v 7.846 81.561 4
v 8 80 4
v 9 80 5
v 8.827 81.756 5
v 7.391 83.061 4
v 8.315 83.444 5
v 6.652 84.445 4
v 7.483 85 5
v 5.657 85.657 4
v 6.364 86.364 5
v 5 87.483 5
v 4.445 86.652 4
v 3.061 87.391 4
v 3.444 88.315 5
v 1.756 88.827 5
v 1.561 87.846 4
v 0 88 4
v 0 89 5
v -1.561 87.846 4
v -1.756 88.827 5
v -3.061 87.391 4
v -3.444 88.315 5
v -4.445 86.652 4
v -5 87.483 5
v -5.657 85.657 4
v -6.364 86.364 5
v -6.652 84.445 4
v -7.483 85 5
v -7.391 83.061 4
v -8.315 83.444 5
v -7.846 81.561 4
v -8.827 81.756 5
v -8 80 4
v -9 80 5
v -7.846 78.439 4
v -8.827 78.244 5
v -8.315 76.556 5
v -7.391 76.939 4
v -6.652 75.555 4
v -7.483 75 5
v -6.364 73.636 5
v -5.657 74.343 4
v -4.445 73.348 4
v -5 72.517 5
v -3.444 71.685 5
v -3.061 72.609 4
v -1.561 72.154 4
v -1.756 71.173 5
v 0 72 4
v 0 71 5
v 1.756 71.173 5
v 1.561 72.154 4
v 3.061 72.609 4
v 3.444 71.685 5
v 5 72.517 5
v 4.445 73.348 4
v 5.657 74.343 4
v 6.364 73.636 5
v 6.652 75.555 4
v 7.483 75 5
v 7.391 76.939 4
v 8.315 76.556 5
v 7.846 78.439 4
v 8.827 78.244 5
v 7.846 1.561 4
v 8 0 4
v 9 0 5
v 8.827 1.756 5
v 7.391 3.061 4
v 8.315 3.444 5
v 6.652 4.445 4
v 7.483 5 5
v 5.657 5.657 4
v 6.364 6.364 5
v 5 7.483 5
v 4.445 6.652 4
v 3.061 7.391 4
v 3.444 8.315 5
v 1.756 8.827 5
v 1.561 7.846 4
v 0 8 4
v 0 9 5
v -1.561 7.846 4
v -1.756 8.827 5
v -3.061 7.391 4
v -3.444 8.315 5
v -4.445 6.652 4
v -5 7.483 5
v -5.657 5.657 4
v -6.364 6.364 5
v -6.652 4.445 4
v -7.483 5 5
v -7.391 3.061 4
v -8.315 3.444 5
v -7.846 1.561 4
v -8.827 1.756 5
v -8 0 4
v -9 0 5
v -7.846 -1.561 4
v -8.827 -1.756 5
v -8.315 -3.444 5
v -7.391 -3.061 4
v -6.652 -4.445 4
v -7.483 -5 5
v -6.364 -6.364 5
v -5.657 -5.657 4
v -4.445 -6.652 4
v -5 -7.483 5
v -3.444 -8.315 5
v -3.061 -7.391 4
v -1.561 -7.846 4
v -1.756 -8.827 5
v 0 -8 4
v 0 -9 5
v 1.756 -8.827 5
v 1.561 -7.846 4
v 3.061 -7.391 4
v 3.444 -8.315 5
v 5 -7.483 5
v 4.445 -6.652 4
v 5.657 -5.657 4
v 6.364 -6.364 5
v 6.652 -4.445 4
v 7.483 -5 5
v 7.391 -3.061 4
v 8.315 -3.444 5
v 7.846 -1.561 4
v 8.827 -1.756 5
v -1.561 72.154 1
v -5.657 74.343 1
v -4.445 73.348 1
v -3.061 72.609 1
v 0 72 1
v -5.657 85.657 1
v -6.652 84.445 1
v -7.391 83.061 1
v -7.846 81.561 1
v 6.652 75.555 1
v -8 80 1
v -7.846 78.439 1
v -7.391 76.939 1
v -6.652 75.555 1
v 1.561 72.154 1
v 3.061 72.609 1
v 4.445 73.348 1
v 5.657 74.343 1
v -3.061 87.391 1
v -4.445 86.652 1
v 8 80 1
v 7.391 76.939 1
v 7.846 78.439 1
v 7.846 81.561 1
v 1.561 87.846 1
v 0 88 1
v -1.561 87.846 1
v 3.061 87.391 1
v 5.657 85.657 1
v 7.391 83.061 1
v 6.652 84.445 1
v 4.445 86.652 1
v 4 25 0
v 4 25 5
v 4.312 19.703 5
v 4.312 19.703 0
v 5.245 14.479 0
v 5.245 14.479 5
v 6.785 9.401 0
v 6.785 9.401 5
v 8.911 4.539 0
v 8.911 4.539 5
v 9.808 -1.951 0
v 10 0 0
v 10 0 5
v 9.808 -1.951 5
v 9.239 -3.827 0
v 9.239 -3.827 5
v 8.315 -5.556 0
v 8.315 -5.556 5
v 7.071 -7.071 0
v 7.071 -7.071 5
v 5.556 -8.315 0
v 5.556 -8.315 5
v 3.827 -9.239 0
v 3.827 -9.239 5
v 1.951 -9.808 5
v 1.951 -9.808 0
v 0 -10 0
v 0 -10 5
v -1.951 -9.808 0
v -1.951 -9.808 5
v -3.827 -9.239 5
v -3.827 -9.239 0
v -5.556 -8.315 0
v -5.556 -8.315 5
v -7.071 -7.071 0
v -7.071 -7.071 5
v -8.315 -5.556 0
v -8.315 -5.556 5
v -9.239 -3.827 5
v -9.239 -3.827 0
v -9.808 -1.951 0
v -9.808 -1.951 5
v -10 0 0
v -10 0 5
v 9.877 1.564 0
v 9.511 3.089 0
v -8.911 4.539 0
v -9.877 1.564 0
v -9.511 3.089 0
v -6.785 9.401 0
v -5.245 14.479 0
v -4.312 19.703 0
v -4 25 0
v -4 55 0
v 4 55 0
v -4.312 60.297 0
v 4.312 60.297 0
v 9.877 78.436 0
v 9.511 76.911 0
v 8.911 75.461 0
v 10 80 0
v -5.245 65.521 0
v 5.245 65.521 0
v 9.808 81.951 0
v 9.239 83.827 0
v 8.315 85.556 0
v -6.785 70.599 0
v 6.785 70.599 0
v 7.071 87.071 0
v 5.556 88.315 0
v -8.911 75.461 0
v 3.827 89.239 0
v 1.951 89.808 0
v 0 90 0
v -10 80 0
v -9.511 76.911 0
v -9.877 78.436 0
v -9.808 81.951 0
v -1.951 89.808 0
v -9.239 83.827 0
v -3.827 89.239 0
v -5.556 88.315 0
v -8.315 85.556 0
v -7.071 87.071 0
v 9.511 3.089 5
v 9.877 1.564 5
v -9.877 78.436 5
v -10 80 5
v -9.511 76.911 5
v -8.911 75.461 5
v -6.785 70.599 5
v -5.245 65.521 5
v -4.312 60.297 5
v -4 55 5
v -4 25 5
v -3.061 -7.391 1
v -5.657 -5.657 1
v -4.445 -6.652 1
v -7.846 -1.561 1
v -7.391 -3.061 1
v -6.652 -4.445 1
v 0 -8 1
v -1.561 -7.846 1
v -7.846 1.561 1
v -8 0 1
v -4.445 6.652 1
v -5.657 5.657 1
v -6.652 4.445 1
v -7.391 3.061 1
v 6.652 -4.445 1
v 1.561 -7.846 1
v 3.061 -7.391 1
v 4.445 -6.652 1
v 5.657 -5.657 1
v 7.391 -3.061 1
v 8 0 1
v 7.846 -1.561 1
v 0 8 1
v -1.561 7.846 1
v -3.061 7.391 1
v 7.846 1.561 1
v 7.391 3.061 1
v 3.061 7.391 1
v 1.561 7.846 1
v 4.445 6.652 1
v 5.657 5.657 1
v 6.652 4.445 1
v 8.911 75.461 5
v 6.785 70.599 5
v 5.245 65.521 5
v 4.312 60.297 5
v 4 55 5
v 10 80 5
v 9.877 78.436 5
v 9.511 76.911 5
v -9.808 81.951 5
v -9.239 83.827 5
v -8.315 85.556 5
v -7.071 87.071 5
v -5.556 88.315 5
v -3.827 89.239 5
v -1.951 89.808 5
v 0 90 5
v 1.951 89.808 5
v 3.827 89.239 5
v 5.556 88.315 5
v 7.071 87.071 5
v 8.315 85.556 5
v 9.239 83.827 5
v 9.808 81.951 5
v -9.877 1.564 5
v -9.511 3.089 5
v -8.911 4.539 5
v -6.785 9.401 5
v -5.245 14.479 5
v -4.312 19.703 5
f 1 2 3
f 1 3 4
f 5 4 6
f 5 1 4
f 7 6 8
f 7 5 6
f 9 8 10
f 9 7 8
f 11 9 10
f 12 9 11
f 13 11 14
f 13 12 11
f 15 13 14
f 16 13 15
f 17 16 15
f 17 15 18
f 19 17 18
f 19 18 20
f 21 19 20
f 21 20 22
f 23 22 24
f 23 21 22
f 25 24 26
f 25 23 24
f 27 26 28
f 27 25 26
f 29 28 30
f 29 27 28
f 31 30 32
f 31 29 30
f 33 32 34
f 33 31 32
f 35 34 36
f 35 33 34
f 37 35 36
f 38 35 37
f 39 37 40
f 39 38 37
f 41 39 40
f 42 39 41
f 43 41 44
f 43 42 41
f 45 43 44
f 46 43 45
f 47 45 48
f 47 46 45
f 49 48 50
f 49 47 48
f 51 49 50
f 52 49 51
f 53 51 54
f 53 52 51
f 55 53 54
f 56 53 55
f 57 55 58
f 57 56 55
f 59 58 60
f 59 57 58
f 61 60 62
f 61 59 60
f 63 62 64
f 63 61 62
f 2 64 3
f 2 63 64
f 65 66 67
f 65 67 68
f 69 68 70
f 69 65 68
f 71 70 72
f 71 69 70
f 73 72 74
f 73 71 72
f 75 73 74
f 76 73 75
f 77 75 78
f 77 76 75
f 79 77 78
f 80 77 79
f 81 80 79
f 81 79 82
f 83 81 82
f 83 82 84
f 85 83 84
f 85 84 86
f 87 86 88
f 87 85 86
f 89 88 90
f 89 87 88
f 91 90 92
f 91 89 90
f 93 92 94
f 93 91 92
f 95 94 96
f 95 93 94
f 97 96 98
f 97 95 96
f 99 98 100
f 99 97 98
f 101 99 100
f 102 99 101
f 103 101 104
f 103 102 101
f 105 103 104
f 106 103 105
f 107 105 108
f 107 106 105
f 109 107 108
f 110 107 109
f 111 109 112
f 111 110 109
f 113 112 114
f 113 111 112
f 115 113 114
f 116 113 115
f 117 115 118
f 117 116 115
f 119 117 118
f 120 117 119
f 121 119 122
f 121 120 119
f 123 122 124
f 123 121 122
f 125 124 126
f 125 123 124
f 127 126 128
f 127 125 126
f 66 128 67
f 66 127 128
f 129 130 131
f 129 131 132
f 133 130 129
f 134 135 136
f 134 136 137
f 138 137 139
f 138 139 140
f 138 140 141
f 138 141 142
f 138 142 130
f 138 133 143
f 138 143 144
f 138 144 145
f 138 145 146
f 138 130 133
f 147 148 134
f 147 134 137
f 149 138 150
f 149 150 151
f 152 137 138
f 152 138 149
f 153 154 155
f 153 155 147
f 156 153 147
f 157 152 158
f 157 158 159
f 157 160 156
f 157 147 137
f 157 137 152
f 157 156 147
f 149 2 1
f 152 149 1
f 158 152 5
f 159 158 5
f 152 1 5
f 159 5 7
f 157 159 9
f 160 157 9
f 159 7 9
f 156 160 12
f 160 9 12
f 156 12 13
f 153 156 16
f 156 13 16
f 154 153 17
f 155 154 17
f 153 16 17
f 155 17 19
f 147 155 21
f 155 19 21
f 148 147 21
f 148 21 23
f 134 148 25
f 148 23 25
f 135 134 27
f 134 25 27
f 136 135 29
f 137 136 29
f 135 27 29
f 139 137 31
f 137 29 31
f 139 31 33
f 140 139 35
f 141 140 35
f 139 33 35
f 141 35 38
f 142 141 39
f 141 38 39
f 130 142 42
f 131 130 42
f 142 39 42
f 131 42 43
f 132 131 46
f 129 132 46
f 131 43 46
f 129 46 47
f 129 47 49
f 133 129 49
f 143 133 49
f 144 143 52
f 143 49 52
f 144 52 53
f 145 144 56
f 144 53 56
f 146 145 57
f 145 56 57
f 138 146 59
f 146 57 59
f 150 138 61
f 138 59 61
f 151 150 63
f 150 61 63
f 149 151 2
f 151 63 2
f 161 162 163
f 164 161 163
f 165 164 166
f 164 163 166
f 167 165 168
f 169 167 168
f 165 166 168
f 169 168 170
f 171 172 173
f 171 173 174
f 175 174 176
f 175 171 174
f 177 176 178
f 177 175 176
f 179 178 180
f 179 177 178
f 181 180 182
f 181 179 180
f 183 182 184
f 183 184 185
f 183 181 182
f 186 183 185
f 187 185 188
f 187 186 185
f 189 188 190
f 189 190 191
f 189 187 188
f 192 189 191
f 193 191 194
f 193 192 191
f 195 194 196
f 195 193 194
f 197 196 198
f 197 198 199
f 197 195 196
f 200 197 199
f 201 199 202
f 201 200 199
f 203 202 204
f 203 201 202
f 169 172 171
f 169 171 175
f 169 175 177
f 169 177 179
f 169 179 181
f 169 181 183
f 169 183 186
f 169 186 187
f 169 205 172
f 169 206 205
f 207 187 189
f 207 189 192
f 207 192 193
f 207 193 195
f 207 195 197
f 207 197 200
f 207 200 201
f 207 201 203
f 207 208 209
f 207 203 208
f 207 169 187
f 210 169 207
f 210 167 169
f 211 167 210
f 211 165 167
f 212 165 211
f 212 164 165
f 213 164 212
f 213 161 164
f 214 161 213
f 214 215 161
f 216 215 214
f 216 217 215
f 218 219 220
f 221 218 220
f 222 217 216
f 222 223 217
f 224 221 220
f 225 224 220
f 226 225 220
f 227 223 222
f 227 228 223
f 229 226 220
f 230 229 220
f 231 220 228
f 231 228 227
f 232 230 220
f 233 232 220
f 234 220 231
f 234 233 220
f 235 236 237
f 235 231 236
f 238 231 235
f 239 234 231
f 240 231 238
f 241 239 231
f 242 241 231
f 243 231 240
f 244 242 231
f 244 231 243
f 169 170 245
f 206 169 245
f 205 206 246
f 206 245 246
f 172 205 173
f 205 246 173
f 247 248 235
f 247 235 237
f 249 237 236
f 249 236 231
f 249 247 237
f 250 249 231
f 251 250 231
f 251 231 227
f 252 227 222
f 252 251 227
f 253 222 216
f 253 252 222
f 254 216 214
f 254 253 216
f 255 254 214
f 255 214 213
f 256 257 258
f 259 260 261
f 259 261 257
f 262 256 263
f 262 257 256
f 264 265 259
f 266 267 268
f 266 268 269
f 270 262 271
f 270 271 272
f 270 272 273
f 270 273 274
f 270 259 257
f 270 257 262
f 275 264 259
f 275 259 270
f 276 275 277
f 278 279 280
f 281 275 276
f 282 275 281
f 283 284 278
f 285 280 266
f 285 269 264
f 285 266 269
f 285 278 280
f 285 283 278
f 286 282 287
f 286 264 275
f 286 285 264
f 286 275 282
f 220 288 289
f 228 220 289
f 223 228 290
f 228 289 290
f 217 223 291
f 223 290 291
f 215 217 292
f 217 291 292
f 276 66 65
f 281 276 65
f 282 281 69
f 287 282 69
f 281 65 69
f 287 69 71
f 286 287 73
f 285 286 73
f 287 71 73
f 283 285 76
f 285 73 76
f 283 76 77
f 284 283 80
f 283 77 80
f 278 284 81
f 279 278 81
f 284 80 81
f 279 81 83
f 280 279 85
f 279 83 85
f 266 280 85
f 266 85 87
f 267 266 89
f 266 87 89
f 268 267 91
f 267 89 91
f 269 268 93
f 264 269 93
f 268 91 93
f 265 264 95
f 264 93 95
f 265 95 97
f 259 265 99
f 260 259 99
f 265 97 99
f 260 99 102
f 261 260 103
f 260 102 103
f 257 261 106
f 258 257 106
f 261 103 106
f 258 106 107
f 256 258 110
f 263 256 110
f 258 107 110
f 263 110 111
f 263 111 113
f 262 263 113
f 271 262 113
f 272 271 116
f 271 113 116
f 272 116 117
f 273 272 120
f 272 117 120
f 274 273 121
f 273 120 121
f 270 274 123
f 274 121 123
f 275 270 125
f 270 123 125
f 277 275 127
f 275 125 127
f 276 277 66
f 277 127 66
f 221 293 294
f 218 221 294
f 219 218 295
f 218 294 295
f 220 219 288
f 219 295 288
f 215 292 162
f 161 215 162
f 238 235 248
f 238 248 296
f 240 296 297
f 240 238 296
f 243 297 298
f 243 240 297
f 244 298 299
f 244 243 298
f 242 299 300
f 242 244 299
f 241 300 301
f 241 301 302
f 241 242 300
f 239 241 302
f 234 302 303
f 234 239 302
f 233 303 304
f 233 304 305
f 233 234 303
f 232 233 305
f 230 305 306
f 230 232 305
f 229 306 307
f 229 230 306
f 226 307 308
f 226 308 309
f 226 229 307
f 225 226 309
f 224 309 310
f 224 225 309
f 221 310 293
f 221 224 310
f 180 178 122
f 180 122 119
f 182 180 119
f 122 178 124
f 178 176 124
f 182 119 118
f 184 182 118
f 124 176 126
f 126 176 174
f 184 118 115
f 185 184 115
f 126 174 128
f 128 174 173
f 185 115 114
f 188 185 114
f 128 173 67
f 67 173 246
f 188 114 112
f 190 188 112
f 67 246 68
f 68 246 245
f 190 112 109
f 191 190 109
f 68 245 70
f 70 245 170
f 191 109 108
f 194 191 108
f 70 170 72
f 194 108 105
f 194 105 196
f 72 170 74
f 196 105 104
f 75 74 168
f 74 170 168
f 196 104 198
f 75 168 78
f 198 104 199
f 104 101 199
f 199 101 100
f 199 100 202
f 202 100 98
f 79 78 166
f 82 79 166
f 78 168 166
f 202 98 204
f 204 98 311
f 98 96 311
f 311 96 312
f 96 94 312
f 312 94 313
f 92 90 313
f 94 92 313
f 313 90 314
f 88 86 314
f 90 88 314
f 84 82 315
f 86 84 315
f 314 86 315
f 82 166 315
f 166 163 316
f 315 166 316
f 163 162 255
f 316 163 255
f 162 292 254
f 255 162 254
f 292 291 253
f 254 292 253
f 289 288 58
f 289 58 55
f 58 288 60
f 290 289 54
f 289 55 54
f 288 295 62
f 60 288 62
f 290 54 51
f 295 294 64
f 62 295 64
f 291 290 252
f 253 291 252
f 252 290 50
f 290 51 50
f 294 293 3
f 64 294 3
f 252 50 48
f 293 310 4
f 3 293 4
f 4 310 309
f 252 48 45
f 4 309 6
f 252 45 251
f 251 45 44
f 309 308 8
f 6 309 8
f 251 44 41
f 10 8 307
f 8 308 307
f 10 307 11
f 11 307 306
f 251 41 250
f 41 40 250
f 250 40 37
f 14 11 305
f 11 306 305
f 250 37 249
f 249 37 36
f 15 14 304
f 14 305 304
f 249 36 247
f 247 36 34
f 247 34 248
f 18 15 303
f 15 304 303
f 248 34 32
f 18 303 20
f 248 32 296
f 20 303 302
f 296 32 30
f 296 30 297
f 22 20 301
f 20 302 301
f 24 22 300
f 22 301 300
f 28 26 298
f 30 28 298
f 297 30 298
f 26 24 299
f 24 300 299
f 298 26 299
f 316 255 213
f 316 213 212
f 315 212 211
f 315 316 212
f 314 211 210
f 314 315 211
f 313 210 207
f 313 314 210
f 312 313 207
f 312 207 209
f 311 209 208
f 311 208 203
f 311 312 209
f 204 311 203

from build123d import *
from build123d.topology import SkipClean

# Parameters (mm, degrees)
BOSS_EXTRU_1_DEPTH      = 5
ESQUISSE2_R             = 8
ENL_V_MAT_EXTRU_1_DEPTH = 4
ENL_V_MAT_EXTRU_2_DEPTH = 91.691785736
CHANFREIN1_SIZE         = 1


with BuildPart() as part:
    # Esquisse1 → Boss.-Extru.1 (new body)
    with BuildSketch(Plane.XY):
        with BuildLine():
            Line((-10, 0), (-10, 80))
            ThreePointArc((-10, 80), (0, 90), (10, 80))
            Line((10, 80), (10, 0))
            ThreePointArc((10, 0), (0, -10), (-10, 0))
        make_face()
    extrude(amount=BOSS_EXTRU_1_DEPTH)

    # Esquisse2 → Enlèv. mat.-Extru.1 (cut)
    with BuildSketch(Plane.XY.offset(5)):
        Circle(ESQUISSE2_R)
        with Locations((0, 80)):
            Circle(ESQUISSE2_R)
    extrude(amount=-ENL_V_MAT_EXTRU_1_DEPTH, mode=Mode.SUBTRACT)

    # Esquisse3 → Enlèv. mat.-Extru.2 (cut, through all)
    with SkipClean():  # the faces are left unmerged after this step: merging them gives an invalid solid
        with BuildSketch(Plane.XY.offset(5)):
            with BuildLine():
                Line((-4, 55), (-4, 25))
                ThreePointArc((-4, 25), (-5.244872469, 14.478769393), (-8.910741301, 4.538577912))
                ThreePointArc((-8.910741301, 4.538577912), (-9.72387302, 2.333729525), (-10, 0))
                Line((-10, 0), (-10, 80))
                ThreePointArc((-10, 80), (-9.72387302, 77.666270475), (-8.910741301, 75.461422088))
                ThreePointArc((-8.910741301, 75.461422088), (-5.244872469, 65.521230607), (-4, 55))
            make_face()
            with BuildLine():
                Line((4, 55), (4, 25))
                ThreePointArc((4, 25), (5.244872469, 14.478769393), (8.910741301, 4.538577912))
                ThreePointArc((8.910741301, 4.538577912), (9.72387302, 2.333729525), (10, 0))
                Line((10, 0), (10, 80))
                ThreePointArc((10, 80), (9.72387302, 77.666270475), (8.910741301, 75.461422088))
                ThreePointArc((8.910741301, 75.461422088), (5.244872469, 65.521230607), (4, 55))
            make_face()
        extrude(amount=-ENL_V_MAT_EXTRU_2_DEPTH, mode=Mode.SUBTRACT)

    # Chanfrein1
    chanfrein1_edges = [part.edges().sort_by_distance(p)[0] for p in [
        (-8, 0, 5),
        (-8, 80, 5),
    ]]
    chamfer(chanfrein1_edges, length=CHANFREIN1_SIZE)


solid = part.part
